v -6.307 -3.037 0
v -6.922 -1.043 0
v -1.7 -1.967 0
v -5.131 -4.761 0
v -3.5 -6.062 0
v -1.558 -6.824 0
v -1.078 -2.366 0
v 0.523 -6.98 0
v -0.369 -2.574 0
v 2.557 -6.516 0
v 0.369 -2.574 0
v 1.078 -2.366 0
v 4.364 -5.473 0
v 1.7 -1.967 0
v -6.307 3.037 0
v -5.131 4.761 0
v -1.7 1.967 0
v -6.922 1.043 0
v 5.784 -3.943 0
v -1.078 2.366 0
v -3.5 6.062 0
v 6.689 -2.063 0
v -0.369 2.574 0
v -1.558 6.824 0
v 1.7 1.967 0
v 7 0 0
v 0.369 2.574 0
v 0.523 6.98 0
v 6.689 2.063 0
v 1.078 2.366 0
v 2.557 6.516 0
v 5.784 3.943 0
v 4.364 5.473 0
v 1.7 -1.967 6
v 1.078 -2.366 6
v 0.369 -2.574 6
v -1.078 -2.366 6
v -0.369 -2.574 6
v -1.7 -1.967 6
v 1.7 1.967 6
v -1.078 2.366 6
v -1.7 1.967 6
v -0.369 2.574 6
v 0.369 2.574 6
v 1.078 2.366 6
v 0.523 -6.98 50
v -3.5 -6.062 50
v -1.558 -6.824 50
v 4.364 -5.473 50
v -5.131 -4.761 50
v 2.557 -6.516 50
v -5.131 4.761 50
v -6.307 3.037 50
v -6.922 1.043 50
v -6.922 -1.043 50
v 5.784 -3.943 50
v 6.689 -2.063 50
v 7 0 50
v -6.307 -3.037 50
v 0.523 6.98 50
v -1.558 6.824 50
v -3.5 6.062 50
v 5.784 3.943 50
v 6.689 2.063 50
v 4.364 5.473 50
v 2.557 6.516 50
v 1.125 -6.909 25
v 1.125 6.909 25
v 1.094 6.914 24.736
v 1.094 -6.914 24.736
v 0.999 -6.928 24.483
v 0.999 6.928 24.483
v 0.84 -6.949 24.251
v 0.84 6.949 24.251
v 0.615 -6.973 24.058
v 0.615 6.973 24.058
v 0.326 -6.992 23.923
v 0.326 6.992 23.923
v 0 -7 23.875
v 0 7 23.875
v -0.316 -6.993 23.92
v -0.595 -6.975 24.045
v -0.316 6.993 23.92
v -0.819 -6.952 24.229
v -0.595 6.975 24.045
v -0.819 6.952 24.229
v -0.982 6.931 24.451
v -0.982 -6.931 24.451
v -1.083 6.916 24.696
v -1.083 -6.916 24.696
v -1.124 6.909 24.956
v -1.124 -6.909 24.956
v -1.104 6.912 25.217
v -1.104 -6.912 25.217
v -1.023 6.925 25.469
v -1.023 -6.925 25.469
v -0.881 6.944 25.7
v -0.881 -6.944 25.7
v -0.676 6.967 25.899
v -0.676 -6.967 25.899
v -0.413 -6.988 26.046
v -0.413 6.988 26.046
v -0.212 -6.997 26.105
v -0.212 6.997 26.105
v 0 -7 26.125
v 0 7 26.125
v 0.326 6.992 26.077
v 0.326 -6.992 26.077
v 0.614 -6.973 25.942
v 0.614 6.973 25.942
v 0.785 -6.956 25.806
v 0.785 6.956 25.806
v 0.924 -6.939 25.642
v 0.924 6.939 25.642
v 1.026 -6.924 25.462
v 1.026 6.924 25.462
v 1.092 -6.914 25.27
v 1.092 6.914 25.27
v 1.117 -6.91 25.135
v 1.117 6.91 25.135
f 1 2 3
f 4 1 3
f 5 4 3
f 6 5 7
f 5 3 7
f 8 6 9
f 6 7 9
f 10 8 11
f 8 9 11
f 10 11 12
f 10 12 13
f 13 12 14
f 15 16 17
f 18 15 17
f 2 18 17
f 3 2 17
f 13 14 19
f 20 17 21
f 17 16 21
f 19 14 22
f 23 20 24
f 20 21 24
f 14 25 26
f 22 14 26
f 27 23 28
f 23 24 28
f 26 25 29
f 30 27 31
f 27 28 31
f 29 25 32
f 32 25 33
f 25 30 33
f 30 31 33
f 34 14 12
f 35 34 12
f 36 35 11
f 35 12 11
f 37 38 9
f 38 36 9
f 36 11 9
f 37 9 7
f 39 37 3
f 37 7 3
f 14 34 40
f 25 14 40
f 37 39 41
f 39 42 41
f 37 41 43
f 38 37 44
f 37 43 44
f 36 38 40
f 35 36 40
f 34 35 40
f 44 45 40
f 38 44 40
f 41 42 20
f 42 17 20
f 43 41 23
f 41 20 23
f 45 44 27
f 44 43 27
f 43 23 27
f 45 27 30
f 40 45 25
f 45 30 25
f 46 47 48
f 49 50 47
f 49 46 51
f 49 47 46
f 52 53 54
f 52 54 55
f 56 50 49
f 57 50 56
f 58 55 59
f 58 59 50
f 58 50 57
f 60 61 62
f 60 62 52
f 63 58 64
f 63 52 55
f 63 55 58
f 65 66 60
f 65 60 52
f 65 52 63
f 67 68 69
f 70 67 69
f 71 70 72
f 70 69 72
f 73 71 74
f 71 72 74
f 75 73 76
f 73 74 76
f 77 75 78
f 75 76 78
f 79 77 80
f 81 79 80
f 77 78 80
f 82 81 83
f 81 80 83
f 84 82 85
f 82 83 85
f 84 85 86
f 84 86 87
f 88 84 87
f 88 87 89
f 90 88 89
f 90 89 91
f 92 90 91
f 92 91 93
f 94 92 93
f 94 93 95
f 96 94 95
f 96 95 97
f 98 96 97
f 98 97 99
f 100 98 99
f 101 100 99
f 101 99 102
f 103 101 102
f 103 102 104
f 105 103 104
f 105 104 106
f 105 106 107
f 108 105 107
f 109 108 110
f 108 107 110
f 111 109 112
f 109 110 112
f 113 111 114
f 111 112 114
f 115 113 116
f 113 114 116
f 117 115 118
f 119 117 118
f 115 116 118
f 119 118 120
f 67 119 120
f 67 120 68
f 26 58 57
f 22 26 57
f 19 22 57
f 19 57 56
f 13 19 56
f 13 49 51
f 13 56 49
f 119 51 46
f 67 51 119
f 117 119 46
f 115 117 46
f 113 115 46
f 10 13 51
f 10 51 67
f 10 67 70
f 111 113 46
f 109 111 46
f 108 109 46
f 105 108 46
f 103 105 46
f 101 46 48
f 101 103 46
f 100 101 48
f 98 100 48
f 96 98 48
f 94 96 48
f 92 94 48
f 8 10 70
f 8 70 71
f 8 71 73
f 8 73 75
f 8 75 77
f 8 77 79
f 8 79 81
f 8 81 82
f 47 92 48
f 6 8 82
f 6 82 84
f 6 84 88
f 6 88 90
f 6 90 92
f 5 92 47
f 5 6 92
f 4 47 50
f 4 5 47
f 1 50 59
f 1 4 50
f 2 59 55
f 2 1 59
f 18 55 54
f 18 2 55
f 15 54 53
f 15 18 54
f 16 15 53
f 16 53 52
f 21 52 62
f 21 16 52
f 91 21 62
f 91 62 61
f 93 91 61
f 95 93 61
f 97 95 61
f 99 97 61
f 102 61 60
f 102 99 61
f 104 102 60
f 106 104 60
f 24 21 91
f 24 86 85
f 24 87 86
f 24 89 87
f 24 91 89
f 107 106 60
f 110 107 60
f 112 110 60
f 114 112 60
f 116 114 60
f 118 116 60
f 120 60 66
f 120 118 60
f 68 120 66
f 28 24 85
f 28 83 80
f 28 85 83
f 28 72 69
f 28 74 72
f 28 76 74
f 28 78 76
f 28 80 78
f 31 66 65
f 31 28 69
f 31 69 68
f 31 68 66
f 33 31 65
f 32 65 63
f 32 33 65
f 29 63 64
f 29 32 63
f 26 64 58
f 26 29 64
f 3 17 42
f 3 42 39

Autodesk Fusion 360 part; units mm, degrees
sketch "Sketch1" plane through (0, 0, 0) normal (0, 0, 1) x (1, 0, 0) in component "Shaft"
  circle A0 centre (0, 0) radius 7
  dimension "d4" = 14
extrude "Extrude1" add sketch "Sketch1" along normal blind 50 in component "Shaft"
sketch "Sketch2" plane through (0, 0, 0) normal (0, 0, 1) x (1, 0, 0) in component "Shaft"
  circle A0 centre (0, 0) radius 2.6
  line L0 (1.7, 2.6) -> (-1.7, 2.6)
  line L1 (-1.7, 2.6) -> (-1.7, -2.6)
  line L2 (-1.7, -2.6) -> (1.7, -2.6)
  line L3 (1.7, -2.6) -> (1.7, 2.6)
  line L4 (1.7, 2.6) -> (-1.7, -2.6) construction
  line L5 (-1.7, 2.6) -> (1.7, -2.6) construction
  dimension "d8" = 5.2
  dimension "d9" = 3.4
  dimension "d10" = 5.2
extrude "Extrude2" cut sketch "Sketch2" along normal blind 6 contours A0 L1 L3 in component "Shaft"
sketch "Sketch3" plane through (0, 0, 0) normal (0, 1, 0) x (1, 0, 0) in component "Shaft"
  line L0 (-7, -50) -> (7, -50)
  line L1 (0, 0) -> (0, -50) construction
  circle A0 centre (0, -25) radius 1.125
  dimension "d15" = 50
  dimension "d16" = 2.25
extrude "Extrude3" cut sketch "Sketch3" along normal blind 7 and the other way blind 7 in component "Shaft"
component "Shaft" placed x (1, 0, 0) y (0, 1, 0) z (0, 0, 1) at (0, 0, 0)
equation "shaftOuterDiameter = 14 mm"
equation "shaftInnerDiameter = 5.2 mm"
equation "shaftInnerSmallDiameter = 3.4 mm"
equation "d4 = shaftOuterDiameter"
equation "shaftHeight = 50 mm"
equation "d6 = shaftHeight"
equation "d8 = shaftInnerDiameter"
equation "d9 = shaftInnerSmallDiameter"
equation "d10 = shaftInnerDiameter"
equation "shaftSmallDepth = 6 mm"
equation "d12 = shaftSmallDepth"
equation "shaftDrillHole = 2.25 mm"
equation "d15 = shaftHeight"
equation "d16 = shaftDrillHole"
equation "d17 = shaftOuterDiameter / 2"
equation "d19 = shaftOuterDiameter / 2"
